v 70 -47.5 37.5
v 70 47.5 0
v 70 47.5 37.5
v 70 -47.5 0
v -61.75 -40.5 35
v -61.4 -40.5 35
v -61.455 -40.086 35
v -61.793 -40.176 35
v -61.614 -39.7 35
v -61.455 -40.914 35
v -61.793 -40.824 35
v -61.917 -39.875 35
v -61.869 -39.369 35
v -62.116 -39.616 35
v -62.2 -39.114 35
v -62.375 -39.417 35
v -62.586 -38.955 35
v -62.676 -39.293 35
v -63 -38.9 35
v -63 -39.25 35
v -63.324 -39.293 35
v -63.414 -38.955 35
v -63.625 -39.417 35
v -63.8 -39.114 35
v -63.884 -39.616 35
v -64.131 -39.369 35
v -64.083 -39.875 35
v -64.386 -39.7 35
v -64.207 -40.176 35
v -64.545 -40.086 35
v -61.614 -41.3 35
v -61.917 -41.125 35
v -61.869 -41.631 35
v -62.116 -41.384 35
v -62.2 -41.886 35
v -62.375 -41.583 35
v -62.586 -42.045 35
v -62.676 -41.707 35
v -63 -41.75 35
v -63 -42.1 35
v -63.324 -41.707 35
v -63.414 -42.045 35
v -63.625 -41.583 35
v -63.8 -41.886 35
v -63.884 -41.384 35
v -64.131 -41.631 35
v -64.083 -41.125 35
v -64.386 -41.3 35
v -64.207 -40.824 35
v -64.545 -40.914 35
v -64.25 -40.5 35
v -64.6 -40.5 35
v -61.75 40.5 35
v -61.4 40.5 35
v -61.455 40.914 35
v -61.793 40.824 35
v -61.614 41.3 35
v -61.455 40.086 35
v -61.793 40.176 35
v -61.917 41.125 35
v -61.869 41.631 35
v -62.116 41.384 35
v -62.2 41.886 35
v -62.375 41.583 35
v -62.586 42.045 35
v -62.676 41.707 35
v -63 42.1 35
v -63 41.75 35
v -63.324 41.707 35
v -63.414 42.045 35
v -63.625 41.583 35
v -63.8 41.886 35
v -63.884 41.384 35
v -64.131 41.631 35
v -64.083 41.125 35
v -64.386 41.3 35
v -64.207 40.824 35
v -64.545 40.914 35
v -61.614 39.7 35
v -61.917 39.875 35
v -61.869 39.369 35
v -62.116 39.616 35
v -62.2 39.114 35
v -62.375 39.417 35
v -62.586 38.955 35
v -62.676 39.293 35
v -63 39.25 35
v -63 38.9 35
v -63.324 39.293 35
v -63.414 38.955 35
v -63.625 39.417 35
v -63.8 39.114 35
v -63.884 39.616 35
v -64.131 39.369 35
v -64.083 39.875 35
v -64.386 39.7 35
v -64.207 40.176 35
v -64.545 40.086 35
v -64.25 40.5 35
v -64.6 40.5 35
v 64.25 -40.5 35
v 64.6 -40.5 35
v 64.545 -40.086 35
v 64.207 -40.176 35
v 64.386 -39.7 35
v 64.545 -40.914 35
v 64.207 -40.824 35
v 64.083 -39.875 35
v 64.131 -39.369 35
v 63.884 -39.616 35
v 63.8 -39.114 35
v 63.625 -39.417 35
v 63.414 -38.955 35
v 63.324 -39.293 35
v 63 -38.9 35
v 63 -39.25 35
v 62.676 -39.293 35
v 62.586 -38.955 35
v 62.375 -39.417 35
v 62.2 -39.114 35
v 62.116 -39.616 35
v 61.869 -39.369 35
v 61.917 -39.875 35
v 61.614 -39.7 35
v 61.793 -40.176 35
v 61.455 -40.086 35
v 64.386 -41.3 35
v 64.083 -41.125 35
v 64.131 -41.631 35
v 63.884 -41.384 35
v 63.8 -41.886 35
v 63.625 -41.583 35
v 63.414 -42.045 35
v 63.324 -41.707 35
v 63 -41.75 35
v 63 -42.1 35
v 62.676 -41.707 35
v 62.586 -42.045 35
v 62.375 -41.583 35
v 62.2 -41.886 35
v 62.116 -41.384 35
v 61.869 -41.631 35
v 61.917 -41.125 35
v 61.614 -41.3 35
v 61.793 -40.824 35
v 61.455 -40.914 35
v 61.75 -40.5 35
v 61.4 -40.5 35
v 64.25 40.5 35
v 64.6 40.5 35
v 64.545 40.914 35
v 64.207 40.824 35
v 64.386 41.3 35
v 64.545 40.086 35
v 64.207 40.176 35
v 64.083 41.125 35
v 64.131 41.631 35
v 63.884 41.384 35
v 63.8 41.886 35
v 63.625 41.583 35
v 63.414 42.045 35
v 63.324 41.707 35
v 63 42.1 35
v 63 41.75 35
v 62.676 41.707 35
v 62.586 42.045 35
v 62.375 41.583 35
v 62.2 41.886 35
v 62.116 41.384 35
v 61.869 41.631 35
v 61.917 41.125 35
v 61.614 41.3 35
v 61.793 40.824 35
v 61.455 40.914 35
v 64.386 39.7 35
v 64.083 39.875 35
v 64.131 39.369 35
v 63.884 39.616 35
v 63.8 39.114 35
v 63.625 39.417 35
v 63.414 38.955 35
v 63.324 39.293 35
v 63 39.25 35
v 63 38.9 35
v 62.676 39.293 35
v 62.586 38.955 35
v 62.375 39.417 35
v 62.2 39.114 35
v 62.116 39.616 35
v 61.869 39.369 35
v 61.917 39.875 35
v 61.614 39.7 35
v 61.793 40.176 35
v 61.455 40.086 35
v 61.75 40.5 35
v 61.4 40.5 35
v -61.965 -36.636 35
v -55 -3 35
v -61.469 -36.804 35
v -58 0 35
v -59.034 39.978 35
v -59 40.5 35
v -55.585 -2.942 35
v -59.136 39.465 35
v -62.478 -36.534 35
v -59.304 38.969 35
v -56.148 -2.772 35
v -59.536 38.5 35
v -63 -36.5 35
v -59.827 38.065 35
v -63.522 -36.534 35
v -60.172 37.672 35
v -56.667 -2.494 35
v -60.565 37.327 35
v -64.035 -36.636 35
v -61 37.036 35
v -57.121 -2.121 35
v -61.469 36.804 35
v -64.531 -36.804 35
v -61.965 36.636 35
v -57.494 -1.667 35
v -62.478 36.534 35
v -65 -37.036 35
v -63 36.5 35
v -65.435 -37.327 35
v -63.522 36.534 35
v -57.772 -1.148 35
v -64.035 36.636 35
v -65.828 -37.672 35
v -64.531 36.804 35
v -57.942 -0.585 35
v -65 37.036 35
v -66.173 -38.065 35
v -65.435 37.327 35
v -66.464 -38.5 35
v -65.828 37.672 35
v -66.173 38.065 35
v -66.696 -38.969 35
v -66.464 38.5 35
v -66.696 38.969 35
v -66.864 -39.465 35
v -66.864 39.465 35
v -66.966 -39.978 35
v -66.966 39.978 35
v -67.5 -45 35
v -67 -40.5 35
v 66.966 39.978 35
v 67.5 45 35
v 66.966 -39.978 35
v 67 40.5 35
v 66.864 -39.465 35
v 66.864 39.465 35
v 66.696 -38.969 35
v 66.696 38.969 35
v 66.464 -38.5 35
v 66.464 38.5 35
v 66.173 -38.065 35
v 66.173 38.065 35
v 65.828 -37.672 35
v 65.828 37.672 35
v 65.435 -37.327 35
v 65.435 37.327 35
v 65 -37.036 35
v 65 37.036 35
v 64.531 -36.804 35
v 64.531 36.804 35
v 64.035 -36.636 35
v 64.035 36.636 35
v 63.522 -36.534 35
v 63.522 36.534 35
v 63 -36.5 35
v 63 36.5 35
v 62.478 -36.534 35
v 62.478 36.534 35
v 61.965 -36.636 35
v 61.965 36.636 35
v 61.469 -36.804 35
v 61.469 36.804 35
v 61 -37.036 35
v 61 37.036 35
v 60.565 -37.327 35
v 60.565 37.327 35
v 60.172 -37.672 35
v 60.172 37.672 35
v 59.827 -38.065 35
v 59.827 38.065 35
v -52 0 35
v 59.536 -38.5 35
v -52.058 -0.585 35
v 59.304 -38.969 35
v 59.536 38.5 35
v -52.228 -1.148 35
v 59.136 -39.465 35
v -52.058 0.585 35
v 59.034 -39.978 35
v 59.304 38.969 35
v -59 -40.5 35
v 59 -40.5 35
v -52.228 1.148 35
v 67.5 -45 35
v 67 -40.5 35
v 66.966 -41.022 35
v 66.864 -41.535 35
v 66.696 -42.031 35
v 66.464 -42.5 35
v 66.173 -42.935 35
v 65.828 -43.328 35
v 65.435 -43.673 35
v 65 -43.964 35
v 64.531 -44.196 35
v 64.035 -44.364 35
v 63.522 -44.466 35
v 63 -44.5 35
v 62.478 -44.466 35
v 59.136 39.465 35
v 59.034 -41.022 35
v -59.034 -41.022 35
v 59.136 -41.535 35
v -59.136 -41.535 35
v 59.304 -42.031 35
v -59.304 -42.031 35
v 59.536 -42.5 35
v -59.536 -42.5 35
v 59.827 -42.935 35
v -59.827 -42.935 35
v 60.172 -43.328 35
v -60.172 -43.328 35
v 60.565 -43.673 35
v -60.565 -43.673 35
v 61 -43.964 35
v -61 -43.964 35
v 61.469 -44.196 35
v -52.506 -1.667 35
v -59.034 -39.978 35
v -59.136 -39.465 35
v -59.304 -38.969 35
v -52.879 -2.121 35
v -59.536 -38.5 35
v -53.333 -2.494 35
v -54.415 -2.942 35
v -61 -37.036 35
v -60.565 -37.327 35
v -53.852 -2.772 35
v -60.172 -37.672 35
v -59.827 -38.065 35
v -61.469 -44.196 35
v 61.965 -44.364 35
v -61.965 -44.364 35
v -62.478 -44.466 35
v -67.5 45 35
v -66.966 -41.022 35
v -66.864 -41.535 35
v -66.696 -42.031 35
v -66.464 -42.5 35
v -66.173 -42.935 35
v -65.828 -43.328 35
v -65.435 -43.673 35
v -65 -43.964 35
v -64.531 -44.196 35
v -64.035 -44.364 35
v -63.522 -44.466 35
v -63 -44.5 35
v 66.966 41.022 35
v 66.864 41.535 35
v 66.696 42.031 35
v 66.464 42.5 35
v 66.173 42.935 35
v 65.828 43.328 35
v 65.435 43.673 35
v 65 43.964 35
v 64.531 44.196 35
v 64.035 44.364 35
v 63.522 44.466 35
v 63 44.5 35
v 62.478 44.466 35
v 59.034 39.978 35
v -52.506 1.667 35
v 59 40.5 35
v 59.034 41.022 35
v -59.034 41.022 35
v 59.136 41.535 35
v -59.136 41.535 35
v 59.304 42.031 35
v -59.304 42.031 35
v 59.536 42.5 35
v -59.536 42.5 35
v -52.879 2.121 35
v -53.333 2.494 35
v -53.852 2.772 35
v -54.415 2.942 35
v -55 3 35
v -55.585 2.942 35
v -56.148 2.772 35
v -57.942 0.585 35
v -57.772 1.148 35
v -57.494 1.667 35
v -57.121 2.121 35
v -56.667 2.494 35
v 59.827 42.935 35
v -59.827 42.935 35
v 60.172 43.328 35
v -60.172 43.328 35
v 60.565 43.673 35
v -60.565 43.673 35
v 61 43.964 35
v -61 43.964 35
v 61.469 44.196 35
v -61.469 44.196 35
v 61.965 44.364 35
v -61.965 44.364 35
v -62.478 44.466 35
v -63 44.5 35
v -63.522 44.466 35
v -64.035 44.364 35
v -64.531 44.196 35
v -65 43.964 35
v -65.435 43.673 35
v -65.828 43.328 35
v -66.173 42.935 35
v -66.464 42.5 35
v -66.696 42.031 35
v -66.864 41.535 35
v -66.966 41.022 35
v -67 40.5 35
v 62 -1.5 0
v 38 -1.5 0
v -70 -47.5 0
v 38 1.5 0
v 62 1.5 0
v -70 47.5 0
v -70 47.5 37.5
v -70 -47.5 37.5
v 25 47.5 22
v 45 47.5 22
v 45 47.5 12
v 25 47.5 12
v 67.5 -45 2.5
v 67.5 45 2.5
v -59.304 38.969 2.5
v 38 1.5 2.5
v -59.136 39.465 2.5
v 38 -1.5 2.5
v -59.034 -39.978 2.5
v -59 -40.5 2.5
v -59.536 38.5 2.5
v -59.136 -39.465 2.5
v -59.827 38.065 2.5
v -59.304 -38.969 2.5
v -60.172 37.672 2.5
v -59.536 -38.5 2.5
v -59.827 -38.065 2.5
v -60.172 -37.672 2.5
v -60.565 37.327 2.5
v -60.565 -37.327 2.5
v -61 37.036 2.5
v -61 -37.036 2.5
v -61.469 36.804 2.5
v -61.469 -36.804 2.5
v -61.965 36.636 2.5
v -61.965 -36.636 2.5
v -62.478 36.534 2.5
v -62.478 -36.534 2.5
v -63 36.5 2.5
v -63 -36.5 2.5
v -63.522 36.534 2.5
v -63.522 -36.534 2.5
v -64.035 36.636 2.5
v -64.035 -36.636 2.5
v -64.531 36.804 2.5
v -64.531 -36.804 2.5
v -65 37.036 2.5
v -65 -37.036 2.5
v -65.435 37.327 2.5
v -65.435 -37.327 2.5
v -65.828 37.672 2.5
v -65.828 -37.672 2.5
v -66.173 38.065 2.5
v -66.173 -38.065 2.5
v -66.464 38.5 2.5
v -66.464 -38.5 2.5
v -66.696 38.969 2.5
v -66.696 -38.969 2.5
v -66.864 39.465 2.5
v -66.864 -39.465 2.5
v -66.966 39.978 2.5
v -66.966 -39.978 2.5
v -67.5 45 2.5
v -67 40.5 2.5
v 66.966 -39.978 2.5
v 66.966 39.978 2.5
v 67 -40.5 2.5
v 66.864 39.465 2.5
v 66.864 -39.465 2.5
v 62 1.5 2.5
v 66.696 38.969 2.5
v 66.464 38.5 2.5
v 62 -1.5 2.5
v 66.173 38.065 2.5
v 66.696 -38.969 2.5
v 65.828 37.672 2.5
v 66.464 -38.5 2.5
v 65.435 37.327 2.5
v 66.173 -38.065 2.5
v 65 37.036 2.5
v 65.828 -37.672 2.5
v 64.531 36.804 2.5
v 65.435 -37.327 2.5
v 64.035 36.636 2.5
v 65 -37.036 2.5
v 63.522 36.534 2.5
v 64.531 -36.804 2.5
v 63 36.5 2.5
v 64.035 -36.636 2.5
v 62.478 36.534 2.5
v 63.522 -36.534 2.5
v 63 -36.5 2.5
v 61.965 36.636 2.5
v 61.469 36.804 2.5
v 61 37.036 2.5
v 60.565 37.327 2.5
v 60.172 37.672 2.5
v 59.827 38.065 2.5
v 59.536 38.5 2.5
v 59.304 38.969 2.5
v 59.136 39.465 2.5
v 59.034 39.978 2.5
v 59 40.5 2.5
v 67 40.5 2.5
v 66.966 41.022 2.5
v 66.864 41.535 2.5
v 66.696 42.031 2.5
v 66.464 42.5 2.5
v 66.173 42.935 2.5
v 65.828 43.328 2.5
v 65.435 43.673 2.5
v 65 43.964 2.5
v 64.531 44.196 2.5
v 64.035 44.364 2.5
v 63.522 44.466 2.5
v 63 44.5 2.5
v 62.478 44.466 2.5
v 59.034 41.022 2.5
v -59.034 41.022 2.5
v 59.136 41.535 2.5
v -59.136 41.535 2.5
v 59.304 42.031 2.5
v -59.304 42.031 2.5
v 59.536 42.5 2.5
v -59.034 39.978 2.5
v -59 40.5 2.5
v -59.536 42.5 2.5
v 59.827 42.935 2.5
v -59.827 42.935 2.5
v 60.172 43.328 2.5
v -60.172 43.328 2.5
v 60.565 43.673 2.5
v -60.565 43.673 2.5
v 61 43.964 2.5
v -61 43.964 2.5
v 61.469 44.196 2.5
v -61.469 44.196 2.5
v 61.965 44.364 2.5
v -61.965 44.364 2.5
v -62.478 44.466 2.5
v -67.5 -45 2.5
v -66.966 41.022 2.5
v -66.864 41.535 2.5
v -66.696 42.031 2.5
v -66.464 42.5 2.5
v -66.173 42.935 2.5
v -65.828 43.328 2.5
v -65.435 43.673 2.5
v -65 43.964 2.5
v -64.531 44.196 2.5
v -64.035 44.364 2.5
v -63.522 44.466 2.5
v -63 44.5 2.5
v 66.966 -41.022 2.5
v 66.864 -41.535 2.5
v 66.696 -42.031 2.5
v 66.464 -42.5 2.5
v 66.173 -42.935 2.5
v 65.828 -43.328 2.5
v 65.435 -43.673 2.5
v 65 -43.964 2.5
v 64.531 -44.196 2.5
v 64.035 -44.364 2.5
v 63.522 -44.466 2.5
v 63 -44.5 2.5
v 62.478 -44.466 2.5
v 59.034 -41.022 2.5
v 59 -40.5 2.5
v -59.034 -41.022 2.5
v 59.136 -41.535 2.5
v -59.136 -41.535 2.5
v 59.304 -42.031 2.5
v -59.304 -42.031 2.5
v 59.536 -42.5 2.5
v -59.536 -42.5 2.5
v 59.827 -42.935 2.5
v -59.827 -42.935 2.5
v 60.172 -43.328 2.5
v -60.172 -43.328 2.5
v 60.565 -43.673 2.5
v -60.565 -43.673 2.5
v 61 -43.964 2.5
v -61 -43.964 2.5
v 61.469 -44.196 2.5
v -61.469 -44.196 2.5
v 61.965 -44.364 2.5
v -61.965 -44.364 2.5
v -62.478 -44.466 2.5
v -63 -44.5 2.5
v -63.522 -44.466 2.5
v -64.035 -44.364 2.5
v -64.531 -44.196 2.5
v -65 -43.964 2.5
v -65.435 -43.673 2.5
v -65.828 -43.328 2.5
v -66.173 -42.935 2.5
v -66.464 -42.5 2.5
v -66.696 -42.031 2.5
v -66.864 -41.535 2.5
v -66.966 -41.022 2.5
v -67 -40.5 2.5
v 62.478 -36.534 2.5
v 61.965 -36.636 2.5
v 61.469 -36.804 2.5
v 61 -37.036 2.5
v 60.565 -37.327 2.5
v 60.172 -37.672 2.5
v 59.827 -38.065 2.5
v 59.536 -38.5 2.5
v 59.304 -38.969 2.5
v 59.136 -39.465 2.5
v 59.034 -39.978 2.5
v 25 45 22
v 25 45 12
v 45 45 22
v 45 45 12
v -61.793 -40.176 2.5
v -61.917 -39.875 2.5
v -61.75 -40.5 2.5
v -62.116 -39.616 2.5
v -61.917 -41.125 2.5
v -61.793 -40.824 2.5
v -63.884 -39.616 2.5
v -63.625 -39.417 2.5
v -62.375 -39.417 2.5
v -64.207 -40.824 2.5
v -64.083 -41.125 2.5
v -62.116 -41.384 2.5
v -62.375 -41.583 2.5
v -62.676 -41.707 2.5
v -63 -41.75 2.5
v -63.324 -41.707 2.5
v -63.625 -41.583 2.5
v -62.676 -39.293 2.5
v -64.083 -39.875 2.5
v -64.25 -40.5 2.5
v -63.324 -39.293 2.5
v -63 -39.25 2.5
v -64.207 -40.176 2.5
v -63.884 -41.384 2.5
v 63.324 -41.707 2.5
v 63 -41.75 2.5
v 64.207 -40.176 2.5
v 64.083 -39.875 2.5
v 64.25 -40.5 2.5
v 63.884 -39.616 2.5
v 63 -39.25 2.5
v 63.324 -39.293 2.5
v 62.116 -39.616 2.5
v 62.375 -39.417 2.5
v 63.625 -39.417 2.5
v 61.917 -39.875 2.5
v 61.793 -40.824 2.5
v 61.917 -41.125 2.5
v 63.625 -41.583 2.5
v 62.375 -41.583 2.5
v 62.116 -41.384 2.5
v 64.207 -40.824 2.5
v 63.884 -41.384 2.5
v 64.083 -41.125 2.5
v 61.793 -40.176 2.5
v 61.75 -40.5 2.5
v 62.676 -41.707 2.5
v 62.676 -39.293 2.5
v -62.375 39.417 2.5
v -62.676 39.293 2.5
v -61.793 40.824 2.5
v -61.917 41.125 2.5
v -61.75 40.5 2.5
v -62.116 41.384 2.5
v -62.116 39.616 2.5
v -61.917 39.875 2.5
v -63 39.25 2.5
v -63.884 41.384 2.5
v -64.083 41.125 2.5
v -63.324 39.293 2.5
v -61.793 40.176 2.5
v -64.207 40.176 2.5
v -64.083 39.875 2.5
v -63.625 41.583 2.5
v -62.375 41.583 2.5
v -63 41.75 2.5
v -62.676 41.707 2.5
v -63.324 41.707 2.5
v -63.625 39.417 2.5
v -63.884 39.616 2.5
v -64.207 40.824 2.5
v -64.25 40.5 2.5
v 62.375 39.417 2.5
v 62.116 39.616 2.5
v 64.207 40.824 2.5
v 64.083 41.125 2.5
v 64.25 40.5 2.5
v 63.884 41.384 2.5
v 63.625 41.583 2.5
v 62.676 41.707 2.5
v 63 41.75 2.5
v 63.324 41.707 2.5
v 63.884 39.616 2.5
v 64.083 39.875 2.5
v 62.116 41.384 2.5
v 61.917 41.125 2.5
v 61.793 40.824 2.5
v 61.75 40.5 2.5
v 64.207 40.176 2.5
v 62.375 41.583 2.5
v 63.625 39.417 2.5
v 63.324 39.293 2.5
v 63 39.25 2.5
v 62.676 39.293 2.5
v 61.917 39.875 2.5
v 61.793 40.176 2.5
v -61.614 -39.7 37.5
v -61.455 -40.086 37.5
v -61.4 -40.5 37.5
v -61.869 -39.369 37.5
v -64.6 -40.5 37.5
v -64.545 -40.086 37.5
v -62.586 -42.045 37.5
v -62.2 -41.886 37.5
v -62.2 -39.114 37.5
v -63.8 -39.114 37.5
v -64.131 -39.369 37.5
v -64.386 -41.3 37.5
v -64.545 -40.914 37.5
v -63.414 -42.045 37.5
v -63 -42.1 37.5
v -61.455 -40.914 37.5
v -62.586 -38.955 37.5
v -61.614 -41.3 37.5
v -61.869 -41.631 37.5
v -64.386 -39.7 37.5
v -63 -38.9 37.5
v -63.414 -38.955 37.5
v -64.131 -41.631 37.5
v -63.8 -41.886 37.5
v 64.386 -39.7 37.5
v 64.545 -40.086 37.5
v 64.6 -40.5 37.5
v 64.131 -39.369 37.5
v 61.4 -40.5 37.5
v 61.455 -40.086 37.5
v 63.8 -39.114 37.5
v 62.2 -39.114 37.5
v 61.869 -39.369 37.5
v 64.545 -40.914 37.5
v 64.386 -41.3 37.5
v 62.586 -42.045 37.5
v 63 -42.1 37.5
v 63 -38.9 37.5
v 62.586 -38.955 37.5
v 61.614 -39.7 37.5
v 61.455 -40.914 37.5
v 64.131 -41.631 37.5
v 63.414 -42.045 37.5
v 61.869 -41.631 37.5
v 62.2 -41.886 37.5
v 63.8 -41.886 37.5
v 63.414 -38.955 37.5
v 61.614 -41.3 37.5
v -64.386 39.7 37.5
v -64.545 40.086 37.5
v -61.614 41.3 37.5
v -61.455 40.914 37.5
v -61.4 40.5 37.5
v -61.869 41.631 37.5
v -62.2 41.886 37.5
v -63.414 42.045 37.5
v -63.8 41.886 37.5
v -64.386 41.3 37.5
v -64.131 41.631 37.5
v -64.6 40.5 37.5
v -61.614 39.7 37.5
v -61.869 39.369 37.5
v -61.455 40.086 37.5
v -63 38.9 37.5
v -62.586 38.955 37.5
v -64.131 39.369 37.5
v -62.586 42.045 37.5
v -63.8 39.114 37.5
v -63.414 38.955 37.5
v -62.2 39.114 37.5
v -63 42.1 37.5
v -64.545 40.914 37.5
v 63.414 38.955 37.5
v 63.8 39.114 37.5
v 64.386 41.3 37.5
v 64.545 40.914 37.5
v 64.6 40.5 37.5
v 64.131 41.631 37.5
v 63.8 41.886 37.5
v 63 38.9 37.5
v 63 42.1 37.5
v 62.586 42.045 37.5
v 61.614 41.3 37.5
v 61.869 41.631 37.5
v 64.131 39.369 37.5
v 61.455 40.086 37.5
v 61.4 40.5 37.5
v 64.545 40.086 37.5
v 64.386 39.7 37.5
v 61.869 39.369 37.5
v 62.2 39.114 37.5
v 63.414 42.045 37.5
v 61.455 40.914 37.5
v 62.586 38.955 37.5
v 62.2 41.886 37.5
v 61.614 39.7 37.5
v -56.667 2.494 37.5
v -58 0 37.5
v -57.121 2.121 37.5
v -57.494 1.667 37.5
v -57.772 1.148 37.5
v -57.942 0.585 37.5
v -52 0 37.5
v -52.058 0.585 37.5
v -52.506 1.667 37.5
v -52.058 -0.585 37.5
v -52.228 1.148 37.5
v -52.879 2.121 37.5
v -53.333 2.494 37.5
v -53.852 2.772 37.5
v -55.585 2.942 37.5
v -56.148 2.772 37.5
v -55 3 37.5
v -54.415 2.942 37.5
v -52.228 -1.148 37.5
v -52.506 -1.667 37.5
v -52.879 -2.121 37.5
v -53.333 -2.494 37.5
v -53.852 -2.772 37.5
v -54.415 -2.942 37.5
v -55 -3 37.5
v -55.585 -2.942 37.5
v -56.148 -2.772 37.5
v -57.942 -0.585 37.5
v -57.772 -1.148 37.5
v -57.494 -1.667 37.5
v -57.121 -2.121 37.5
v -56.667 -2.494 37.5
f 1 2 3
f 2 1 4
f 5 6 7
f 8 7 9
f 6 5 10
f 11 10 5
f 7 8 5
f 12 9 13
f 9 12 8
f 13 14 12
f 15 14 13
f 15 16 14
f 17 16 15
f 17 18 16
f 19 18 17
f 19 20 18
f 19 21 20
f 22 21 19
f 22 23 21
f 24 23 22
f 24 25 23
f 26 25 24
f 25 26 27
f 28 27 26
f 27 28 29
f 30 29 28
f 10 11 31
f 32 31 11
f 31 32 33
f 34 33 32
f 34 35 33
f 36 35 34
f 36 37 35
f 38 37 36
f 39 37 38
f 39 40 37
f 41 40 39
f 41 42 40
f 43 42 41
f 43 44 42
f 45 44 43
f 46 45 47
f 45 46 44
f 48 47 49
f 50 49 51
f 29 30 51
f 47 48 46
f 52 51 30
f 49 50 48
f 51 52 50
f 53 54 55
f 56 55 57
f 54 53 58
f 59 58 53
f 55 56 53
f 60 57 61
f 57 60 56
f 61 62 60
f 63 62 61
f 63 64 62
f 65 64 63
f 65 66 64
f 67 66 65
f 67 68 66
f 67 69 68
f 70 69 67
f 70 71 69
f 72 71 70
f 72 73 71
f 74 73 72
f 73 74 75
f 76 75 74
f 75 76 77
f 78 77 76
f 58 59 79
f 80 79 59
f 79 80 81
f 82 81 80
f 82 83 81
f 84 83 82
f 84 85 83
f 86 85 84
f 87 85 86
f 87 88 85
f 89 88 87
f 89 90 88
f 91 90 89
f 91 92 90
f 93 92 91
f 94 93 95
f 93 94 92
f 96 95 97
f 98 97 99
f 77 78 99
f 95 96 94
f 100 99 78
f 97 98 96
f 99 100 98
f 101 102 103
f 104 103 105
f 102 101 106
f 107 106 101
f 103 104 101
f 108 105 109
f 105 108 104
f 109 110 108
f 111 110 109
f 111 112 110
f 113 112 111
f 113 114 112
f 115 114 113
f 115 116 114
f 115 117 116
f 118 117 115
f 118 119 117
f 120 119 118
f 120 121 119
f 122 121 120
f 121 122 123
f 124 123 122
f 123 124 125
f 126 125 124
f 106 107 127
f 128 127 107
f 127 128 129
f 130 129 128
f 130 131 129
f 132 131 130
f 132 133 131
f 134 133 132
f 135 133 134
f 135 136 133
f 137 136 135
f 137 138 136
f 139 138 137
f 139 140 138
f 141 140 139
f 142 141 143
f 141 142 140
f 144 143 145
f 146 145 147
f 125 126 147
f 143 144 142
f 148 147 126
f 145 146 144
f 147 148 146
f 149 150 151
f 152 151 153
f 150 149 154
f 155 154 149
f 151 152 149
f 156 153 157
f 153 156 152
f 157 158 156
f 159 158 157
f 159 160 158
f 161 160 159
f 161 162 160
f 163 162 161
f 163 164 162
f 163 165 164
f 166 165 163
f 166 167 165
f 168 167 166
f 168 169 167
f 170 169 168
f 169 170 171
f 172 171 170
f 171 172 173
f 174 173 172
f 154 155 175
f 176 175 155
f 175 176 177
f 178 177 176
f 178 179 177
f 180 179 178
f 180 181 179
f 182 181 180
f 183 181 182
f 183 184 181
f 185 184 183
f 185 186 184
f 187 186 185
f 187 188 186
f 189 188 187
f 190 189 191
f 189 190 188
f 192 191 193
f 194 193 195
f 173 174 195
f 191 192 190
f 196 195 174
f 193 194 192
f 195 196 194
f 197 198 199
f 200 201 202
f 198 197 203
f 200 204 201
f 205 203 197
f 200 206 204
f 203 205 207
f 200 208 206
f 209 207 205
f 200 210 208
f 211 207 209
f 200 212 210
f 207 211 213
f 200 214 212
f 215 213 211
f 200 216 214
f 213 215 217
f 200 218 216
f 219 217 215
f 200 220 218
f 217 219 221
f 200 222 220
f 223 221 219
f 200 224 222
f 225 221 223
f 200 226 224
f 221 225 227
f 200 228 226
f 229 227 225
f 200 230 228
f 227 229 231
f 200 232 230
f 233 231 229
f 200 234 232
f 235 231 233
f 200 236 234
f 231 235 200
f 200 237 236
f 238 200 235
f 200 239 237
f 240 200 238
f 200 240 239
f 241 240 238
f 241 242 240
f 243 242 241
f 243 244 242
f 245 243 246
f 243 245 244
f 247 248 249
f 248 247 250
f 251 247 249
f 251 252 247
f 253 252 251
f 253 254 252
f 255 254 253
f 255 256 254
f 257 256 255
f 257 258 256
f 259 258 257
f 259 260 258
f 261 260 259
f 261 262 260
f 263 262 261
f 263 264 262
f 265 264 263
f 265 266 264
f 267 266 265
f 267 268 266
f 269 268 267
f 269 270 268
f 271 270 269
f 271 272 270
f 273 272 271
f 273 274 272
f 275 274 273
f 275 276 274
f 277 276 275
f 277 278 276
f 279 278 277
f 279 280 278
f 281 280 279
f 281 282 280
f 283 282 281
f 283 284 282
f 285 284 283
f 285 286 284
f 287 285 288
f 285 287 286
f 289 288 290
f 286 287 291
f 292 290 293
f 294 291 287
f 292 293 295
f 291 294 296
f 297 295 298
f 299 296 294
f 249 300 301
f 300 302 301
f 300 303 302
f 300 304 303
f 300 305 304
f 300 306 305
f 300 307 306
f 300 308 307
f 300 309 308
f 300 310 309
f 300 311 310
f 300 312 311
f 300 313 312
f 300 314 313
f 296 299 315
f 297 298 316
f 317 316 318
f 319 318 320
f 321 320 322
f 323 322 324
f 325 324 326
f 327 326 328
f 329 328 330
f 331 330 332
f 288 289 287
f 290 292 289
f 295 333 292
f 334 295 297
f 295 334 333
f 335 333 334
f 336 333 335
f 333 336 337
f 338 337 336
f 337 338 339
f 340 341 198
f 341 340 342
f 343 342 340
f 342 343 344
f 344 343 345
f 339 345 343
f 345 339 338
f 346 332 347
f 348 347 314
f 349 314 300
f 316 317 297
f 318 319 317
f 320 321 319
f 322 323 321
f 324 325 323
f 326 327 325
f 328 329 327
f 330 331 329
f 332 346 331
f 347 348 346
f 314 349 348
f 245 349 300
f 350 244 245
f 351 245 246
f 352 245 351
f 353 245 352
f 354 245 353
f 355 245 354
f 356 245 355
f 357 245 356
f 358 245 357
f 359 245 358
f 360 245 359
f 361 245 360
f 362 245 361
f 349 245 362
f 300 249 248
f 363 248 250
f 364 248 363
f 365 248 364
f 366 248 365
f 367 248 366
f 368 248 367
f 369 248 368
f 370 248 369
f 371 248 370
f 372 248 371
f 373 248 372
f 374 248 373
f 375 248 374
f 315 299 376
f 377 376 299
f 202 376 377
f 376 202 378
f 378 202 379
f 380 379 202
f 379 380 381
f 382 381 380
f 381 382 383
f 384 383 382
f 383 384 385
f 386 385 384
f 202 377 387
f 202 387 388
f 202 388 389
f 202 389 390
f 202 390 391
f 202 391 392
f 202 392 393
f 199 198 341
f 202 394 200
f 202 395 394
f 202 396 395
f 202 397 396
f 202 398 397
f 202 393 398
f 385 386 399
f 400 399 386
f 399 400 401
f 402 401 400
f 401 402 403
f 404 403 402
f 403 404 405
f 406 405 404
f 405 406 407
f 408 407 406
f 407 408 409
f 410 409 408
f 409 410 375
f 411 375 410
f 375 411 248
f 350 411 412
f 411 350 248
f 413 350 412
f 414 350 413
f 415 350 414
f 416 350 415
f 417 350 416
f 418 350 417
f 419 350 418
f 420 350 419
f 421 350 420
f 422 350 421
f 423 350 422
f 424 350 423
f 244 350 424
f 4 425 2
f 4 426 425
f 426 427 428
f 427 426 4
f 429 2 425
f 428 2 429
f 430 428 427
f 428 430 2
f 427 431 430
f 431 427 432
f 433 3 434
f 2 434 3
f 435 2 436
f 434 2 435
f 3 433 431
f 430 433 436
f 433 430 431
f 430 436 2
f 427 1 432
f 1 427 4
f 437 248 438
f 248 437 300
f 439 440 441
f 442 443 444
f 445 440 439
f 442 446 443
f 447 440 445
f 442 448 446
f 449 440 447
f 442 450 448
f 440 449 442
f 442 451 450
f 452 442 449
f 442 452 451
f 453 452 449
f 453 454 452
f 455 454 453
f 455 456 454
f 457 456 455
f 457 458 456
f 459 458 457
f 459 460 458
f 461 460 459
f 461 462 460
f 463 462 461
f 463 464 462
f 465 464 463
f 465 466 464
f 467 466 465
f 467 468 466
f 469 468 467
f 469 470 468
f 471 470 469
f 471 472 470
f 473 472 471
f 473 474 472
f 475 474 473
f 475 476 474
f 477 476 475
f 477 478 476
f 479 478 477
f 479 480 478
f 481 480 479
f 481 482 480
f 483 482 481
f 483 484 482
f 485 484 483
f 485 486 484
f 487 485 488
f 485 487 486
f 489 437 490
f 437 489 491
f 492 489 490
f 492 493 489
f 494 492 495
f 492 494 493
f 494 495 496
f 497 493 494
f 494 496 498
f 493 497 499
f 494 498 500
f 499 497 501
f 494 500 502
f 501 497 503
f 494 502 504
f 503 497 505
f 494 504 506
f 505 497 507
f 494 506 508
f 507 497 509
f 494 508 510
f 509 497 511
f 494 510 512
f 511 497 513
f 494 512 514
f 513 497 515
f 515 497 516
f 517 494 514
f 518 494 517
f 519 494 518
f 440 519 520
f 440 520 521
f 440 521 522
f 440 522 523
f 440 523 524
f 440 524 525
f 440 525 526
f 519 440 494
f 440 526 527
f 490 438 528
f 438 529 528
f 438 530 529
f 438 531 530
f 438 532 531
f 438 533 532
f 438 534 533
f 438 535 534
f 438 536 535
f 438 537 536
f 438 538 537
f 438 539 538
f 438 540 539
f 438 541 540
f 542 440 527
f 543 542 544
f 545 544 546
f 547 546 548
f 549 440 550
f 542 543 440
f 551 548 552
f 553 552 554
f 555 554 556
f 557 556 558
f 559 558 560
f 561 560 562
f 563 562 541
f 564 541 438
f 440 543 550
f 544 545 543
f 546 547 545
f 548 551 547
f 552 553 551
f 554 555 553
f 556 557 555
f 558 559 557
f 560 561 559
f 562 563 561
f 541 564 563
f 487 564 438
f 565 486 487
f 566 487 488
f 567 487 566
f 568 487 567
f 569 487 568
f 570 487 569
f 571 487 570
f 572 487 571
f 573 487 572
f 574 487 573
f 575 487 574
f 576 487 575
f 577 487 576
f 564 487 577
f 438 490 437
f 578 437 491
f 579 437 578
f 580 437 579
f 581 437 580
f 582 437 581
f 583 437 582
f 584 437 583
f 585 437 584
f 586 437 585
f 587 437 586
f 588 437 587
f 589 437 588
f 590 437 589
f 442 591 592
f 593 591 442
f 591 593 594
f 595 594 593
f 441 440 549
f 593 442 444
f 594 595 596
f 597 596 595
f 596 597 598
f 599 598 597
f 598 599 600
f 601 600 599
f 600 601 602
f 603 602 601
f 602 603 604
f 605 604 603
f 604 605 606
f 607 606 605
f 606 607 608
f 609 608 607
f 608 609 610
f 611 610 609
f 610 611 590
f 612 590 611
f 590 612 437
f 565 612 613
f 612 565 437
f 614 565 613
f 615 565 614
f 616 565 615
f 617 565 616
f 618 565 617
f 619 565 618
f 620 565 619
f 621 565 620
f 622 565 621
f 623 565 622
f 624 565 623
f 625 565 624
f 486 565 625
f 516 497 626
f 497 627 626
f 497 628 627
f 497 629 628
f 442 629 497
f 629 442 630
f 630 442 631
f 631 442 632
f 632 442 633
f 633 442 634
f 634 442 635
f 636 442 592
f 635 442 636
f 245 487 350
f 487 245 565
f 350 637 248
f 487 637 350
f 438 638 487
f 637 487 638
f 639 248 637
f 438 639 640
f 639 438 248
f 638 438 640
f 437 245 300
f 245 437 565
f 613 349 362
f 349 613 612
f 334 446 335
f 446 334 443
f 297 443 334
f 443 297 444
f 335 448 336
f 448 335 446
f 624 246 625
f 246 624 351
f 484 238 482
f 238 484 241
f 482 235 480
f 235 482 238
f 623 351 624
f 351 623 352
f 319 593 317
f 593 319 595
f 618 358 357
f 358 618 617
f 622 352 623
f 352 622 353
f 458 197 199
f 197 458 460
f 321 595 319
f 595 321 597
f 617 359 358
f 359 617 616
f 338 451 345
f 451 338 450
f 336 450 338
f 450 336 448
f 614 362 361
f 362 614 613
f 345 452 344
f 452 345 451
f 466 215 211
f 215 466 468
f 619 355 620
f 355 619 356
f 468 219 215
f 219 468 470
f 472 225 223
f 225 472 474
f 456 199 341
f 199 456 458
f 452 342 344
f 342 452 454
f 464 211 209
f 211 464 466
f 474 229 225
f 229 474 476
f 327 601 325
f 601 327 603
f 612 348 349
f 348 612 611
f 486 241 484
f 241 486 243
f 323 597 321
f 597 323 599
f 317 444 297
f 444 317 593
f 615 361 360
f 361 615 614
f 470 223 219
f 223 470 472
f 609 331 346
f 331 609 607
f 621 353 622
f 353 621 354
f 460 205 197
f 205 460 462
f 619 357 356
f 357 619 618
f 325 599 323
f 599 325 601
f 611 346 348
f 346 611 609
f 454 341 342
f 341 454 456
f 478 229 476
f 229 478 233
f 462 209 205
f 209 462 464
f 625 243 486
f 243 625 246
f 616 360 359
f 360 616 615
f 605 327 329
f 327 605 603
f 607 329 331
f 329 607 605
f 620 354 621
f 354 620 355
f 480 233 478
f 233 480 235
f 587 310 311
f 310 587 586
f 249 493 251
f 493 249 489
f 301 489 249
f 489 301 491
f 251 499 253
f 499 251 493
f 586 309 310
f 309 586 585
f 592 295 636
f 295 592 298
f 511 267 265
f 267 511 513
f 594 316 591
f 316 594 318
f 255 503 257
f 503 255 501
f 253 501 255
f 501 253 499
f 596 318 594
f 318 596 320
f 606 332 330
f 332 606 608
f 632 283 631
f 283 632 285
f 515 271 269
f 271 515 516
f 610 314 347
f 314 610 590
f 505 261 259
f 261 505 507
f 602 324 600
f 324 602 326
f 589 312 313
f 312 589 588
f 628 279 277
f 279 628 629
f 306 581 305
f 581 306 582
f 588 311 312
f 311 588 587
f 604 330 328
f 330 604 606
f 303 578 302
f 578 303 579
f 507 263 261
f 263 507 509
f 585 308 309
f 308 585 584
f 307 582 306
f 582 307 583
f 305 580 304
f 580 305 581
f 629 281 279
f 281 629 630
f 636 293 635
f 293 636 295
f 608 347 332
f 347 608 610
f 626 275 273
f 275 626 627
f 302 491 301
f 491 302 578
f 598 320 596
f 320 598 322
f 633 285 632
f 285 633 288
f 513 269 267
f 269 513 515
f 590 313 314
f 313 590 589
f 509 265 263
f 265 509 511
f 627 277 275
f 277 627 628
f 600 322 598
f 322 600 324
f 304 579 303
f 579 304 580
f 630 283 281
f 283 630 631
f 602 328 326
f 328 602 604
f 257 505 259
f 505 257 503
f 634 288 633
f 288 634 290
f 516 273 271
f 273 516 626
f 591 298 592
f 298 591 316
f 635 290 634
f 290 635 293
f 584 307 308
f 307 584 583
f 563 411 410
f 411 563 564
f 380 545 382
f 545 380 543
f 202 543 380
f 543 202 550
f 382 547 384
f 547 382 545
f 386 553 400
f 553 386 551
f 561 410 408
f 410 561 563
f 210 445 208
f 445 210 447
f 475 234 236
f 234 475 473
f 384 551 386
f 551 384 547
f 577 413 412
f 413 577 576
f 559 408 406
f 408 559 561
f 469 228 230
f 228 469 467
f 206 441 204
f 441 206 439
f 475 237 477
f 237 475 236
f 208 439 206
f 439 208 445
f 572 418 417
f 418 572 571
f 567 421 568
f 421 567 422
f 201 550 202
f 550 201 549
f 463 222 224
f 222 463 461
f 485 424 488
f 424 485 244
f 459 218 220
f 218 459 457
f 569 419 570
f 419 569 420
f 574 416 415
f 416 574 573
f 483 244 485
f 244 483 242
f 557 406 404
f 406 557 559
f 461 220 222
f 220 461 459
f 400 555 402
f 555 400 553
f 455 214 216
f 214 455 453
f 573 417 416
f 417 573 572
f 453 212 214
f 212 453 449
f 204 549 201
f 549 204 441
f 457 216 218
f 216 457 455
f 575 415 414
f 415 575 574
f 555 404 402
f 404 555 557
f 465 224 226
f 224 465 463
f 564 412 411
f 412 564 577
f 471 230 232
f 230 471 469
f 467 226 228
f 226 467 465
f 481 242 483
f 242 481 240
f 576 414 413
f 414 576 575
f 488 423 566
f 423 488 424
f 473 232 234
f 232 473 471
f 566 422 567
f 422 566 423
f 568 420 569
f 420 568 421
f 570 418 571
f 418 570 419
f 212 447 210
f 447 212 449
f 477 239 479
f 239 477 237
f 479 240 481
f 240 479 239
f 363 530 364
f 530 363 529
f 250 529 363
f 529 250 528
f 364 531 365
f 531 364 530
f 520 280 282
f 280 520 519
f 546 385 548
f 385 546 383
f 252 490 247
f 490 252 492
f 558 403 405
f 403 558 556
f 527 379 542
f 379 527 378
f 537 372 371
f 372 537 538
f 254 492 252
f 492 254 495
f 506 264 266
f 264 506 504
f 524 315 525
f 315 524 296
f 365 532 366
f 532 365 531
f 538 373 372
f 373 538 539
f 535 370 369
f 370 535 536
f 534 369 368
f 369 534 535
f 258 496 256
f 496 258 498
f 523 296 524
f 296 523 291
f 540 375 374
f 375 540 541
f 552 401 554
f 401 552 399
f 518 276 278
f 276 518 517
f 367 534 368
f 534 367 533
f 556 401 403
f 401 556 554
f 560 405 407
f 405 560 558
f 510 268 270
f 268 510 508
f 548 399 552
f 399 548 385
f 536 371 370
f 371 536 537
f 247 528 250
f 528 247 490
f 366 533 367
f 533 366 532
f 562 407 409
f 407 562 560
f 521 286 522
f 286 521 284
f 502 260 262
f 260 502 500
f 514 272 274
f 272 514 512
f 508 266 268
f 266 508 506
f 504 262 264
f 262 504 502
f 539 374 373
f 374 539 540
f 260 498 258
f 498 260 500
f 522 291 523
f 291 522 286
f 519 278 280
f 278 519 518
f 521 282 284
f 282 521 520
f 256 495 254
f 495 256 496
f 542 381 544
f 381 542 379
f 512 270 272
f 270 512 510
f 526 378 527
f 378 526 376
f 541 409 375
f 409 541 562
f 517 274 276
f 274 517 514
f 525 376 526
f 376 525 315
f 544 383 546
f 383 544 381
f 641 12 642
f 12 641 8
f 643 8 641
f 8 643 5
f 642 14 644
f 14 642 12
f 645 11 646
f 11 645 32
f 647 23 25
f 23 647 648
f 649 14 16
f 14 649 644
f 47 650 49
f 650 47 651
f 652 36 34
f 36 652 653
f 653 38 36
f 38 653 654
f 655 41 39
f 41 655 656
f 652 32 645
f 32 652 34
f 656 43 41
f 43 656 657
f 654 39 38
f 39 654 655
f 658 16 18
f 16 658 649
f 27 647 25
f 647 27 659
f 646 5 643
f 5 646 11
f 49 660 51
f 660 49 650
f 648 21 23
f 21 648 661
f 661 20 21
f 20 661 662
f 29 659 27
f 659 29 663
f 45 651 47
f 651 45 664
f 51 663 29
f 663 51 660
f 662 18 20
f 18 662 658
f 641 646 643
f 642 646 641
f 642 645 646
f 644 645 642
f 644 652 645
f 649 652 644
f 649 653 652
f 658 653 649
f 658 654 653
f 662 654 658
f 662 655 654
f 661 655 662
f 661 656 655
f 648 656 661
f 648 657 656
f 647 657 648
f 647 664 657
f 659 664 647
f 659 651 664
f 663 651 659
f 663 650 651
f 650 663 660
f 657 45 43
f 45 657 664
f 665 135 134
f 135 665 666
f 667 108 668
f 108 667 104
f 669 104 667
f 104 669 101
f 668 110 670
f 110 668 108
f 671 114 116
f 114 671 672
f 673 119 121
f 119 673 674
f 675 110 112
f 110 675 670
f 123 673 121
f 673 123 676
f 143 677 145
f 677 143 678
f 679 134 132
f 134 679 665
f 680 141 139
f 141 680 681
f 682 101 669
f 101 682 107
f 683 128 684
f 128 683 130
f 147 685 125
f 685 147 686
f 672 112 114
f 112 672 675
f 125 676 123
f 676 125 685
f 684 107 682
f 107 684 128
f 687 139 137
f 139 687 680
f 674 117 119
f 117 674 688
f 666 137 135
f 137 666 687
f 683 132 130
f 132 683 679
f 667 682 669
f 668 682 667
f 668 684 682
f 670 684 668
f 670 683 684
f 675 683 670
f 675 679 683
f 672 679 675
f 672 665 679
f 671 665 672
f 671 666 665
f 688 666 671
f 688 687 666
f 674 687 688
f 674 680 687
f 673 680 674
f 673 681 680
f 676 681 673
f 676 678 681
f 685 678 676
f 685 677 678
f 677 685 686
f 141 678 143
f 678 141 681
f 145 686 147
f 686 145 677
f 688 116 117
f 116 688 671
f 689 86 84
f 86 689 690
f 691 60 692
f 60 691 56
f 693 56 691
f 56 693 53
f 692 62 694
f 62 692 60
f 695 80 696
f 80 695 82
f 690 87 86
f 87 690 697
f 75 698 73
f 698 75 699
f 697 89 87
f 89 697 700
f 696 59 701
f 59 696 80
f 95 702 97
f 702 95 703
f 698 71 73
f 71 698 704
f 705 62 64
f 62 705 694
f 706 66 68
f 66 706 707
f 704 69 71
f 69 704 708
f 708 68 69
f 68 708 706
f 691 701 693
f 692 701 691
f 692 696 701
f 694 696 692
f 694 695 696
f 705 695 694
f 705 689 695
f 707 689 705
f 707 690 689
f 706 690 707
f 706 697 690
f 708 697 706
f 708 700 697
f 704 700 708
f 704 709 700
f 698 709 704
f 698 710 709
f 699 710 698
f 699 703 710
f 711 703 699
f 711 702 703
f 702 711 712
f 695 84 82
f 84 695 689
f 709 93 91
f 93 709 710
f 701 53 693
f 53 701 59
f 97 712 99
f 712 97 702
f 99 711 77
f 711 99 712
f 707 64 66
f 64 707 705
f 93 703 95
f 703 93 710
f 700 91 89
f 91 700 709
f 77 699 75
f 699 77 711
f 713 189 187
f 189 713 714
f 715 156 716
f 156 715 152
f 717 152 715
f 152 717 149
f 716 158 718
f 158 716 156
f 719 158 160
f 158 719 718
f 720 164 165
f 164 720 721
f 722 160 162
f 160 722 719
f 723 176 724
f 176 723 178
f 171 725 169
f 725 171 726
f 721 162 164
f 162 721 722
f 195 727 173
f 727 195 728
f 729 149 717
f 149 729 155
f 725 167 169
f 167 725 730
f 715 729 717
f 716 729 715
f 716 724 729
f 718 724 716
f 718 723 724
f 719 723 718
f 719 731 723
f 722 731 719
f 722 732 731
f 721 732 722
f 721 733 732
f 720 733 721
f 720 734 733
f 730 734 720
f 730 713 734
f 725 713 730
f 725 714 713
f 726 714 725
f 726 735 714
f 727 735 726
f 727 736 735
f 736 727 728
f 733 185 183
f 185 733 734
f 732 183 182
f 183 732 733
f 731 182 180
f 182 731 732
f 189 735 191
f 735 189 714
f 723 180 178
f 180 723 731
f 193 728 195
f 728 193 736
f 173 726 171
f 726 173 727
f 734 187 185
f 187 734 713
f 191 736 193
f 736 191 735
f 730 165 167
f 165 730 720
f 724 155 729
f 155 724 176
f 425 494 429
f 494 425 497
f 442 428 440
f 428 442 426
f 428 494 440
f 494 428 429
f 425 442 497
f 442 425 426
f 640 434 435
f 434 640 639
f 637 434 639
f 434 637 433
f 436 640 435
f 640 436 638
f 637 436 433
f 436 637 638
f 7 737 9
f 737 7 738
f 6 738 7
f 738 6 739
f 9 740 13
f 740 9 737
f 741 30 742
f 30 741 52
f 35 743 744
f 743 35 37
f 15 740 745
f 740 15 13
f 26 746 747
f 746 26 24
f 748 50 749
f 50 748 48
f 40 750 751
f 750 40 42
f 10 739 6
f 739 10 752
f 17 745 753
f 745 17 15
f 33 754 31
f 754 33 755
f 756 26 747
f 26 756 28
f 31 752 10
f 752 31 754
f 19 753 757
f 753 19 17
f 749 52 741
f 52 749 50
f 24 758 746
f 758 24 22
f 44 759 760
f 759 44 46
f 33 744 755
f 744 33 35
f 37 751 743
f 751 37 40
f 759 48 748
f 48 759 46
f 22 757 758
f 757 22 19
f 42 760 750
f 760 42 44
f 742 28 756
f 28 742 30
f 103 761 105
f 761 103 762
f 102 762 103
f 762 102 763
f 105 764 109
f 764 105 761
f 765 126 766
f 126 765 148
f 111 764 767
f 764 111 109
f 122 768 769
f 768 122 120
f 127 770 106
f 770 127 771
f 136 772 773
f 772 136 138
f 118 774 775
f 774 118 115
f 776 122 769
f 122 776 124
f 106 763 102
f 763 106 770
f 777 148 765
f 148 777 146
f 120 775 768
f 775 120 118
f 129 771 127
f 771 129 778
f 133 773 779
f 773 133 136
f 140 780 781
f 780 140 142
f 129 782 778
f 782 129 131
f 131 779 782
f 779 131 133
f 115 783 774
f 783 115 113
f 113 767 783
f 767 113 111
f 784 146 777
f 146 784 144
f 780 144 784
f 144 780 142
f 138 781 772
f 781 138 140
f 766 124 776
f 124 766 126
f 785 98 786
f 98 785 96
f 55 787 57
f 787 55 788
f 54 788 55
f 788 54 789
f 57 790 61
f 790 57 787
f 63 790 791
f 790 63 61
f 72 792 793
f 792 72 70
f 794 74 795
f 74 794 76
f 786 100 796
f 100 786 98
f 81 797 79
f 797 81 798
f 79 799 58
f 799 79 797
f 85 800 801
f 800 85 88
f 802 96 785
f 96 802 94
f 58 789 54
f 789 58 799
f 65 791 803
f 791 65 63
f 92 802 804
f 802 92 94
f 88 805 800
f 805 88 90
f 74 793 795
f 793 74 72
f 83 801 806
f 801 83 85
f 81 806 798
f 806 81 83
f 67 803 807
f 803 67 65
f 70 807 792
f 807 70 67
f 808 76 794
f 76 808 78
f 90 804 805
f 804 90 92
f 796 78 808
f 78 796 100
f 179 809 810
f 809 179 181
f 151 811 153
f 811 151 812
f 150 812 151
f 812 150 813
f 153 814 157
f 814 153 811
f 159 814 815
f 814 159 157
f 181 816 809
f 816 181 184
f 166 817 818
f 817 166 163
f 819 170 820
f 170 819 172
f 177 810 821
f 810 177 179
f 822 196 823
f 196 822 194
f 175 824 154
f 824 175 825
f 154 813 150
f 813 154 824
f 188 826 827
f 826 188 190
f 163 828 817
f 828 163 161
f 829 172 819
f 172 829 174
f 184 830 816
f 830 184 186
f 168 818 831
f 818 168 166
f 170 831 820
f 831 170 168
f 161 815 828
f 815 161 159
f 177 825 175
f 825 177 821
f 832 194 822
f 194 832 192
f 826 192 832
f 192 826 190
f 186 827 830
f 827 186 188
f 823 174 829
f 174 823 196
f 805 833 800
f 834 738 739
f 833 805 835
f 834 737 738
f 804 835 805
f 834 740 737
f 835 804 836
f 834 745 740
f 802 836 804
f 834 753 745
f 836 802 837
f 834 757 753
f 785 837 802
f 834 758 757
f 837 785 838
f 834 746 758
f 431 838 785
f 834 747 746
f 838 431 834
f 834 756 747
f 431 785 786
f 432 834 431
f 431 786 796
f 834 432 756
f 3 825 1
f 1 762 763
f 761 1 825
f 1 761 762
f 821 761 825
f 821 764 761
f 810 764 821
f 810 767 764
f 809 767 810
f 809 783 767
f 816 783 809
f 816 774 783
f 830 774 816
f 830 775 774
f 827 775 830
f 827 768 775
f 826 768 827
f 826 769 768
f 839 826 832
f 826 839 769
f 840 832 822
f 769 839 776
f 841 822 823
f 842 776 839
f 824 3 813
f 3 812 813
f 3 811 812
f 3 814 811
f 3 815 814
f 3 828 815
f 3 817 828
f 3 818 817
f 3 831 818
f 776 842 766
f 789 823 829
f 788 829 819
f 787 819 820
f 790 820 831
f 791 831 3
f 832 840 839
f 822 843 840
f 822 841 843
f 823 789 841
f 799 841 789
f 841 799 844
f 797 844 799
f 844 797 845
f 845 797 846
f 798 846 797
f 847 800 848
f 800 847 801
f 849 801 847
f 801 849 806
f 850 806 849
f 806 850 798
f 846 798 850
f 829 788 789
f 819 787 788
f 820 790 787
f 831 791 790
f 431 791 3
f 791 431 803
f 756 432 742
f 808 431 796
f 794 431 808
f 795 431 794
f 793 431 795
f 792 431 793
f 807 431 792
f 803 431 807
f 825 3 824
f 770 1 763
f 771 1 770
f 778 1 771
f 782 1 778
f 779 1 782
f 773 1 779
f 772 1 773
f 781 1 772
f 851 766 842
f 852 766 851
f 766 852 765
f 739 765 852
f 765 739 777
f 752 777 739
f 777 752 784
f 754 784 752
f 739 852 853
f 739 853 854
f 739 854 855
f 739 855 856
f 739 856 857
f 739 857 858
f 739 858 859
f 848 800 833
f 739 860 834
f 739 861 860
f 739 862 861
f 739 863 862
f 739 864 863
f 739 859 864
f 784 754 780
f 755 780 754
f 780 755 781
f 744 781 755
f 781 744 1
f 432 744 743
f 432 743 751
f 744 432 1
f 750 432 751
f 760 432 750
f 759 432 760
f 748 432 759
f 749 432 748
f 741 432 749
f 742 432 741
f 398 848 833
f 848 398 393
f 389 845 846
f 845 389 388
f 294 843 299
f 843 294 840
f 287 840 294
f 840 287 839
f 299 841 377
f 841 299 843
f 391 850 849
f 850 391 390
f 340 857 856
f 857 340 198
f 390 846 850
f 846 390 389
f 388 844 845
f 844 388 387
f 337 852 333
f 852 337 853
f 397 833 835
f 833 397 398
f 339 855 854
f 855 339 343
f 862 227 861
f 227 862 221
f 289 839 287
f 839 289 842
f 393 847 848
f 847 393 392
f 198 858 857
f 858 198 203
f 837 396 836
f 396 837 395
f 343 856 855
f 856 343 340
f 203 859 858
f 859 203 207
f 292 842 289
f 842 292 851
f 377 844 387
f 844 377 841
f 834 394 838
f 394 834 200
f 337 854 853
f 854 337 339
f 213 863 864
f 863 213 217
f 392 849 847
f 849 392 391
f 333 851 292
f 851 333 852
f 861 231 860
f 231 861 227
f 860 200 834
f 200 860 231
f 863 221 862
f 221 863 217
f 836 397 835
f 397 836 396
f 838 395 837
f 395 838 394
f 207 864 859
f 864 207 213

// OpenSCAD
// SNY-1 soil sensor node enclosure: the printed base and lid of Workshop's
// starter assembly (src/lib/sensor-node.ts), written out in OpenSCAD so the
// workspace build can slice and simulate it. Same sizes as the CAD plans there;
// change both together. All sizes in mm; origin at the centre of the floor.
//
//   openscad -D 'part="base"' -o base.stl enclosure.scad   (also lid; closed = base and lid together)

part = "closed"; // base | lid | lid-print | closed
W = 140; D = 95; H = 35; T = 2.5;
corners = [[-63, -40.5], [63, -40.5], [-63, 40.5], [63, 40.5]];

module base() difference() {
  union() {
    difference() {
      translate([-W / 2, -D / 2, 0]) cube([W, D, H]);
      translate([-W / 2 + T, -D / 2 + T, T]) cube([W - 2 * T, D - 2 * T, H]);
    }
    for (c = corners) translate([c[0], c[1], T]) cylinder(r = 4, h = H - T, $fn = 48);
  }
  // Probe slot through the floor and an air vent beside the CO2 sensor.
  translate([38, -1.5, -1]) cube([24, 3, T + 2]);
  translate([25, D / 2 - T - 1, 12]) cube([20, T + 2, 10]);
  for (c = corners) translate([c[0], c[1], T]) cylinder(r = 1.25, h = H, $fn = 24);
}

// The lid as assembled, on top of the base; a window over the lux sensor.
module lid() translate([0, 0, H]) difference() {
  translate([-W / 2, -D / 2, 0]) cube([W, D, T]);
  translate([-55, 0, -1]) cylinder(r = 3, h = T + 2, $fn = 32);
  for (c = corners) translate([c[0], c[1], -1]) cylinder(r = 1.6, h = T + 2, $fn = 24);
}

if (part == "base") base();
else if (part == "lid") lid();
else { base(); lid(); }
